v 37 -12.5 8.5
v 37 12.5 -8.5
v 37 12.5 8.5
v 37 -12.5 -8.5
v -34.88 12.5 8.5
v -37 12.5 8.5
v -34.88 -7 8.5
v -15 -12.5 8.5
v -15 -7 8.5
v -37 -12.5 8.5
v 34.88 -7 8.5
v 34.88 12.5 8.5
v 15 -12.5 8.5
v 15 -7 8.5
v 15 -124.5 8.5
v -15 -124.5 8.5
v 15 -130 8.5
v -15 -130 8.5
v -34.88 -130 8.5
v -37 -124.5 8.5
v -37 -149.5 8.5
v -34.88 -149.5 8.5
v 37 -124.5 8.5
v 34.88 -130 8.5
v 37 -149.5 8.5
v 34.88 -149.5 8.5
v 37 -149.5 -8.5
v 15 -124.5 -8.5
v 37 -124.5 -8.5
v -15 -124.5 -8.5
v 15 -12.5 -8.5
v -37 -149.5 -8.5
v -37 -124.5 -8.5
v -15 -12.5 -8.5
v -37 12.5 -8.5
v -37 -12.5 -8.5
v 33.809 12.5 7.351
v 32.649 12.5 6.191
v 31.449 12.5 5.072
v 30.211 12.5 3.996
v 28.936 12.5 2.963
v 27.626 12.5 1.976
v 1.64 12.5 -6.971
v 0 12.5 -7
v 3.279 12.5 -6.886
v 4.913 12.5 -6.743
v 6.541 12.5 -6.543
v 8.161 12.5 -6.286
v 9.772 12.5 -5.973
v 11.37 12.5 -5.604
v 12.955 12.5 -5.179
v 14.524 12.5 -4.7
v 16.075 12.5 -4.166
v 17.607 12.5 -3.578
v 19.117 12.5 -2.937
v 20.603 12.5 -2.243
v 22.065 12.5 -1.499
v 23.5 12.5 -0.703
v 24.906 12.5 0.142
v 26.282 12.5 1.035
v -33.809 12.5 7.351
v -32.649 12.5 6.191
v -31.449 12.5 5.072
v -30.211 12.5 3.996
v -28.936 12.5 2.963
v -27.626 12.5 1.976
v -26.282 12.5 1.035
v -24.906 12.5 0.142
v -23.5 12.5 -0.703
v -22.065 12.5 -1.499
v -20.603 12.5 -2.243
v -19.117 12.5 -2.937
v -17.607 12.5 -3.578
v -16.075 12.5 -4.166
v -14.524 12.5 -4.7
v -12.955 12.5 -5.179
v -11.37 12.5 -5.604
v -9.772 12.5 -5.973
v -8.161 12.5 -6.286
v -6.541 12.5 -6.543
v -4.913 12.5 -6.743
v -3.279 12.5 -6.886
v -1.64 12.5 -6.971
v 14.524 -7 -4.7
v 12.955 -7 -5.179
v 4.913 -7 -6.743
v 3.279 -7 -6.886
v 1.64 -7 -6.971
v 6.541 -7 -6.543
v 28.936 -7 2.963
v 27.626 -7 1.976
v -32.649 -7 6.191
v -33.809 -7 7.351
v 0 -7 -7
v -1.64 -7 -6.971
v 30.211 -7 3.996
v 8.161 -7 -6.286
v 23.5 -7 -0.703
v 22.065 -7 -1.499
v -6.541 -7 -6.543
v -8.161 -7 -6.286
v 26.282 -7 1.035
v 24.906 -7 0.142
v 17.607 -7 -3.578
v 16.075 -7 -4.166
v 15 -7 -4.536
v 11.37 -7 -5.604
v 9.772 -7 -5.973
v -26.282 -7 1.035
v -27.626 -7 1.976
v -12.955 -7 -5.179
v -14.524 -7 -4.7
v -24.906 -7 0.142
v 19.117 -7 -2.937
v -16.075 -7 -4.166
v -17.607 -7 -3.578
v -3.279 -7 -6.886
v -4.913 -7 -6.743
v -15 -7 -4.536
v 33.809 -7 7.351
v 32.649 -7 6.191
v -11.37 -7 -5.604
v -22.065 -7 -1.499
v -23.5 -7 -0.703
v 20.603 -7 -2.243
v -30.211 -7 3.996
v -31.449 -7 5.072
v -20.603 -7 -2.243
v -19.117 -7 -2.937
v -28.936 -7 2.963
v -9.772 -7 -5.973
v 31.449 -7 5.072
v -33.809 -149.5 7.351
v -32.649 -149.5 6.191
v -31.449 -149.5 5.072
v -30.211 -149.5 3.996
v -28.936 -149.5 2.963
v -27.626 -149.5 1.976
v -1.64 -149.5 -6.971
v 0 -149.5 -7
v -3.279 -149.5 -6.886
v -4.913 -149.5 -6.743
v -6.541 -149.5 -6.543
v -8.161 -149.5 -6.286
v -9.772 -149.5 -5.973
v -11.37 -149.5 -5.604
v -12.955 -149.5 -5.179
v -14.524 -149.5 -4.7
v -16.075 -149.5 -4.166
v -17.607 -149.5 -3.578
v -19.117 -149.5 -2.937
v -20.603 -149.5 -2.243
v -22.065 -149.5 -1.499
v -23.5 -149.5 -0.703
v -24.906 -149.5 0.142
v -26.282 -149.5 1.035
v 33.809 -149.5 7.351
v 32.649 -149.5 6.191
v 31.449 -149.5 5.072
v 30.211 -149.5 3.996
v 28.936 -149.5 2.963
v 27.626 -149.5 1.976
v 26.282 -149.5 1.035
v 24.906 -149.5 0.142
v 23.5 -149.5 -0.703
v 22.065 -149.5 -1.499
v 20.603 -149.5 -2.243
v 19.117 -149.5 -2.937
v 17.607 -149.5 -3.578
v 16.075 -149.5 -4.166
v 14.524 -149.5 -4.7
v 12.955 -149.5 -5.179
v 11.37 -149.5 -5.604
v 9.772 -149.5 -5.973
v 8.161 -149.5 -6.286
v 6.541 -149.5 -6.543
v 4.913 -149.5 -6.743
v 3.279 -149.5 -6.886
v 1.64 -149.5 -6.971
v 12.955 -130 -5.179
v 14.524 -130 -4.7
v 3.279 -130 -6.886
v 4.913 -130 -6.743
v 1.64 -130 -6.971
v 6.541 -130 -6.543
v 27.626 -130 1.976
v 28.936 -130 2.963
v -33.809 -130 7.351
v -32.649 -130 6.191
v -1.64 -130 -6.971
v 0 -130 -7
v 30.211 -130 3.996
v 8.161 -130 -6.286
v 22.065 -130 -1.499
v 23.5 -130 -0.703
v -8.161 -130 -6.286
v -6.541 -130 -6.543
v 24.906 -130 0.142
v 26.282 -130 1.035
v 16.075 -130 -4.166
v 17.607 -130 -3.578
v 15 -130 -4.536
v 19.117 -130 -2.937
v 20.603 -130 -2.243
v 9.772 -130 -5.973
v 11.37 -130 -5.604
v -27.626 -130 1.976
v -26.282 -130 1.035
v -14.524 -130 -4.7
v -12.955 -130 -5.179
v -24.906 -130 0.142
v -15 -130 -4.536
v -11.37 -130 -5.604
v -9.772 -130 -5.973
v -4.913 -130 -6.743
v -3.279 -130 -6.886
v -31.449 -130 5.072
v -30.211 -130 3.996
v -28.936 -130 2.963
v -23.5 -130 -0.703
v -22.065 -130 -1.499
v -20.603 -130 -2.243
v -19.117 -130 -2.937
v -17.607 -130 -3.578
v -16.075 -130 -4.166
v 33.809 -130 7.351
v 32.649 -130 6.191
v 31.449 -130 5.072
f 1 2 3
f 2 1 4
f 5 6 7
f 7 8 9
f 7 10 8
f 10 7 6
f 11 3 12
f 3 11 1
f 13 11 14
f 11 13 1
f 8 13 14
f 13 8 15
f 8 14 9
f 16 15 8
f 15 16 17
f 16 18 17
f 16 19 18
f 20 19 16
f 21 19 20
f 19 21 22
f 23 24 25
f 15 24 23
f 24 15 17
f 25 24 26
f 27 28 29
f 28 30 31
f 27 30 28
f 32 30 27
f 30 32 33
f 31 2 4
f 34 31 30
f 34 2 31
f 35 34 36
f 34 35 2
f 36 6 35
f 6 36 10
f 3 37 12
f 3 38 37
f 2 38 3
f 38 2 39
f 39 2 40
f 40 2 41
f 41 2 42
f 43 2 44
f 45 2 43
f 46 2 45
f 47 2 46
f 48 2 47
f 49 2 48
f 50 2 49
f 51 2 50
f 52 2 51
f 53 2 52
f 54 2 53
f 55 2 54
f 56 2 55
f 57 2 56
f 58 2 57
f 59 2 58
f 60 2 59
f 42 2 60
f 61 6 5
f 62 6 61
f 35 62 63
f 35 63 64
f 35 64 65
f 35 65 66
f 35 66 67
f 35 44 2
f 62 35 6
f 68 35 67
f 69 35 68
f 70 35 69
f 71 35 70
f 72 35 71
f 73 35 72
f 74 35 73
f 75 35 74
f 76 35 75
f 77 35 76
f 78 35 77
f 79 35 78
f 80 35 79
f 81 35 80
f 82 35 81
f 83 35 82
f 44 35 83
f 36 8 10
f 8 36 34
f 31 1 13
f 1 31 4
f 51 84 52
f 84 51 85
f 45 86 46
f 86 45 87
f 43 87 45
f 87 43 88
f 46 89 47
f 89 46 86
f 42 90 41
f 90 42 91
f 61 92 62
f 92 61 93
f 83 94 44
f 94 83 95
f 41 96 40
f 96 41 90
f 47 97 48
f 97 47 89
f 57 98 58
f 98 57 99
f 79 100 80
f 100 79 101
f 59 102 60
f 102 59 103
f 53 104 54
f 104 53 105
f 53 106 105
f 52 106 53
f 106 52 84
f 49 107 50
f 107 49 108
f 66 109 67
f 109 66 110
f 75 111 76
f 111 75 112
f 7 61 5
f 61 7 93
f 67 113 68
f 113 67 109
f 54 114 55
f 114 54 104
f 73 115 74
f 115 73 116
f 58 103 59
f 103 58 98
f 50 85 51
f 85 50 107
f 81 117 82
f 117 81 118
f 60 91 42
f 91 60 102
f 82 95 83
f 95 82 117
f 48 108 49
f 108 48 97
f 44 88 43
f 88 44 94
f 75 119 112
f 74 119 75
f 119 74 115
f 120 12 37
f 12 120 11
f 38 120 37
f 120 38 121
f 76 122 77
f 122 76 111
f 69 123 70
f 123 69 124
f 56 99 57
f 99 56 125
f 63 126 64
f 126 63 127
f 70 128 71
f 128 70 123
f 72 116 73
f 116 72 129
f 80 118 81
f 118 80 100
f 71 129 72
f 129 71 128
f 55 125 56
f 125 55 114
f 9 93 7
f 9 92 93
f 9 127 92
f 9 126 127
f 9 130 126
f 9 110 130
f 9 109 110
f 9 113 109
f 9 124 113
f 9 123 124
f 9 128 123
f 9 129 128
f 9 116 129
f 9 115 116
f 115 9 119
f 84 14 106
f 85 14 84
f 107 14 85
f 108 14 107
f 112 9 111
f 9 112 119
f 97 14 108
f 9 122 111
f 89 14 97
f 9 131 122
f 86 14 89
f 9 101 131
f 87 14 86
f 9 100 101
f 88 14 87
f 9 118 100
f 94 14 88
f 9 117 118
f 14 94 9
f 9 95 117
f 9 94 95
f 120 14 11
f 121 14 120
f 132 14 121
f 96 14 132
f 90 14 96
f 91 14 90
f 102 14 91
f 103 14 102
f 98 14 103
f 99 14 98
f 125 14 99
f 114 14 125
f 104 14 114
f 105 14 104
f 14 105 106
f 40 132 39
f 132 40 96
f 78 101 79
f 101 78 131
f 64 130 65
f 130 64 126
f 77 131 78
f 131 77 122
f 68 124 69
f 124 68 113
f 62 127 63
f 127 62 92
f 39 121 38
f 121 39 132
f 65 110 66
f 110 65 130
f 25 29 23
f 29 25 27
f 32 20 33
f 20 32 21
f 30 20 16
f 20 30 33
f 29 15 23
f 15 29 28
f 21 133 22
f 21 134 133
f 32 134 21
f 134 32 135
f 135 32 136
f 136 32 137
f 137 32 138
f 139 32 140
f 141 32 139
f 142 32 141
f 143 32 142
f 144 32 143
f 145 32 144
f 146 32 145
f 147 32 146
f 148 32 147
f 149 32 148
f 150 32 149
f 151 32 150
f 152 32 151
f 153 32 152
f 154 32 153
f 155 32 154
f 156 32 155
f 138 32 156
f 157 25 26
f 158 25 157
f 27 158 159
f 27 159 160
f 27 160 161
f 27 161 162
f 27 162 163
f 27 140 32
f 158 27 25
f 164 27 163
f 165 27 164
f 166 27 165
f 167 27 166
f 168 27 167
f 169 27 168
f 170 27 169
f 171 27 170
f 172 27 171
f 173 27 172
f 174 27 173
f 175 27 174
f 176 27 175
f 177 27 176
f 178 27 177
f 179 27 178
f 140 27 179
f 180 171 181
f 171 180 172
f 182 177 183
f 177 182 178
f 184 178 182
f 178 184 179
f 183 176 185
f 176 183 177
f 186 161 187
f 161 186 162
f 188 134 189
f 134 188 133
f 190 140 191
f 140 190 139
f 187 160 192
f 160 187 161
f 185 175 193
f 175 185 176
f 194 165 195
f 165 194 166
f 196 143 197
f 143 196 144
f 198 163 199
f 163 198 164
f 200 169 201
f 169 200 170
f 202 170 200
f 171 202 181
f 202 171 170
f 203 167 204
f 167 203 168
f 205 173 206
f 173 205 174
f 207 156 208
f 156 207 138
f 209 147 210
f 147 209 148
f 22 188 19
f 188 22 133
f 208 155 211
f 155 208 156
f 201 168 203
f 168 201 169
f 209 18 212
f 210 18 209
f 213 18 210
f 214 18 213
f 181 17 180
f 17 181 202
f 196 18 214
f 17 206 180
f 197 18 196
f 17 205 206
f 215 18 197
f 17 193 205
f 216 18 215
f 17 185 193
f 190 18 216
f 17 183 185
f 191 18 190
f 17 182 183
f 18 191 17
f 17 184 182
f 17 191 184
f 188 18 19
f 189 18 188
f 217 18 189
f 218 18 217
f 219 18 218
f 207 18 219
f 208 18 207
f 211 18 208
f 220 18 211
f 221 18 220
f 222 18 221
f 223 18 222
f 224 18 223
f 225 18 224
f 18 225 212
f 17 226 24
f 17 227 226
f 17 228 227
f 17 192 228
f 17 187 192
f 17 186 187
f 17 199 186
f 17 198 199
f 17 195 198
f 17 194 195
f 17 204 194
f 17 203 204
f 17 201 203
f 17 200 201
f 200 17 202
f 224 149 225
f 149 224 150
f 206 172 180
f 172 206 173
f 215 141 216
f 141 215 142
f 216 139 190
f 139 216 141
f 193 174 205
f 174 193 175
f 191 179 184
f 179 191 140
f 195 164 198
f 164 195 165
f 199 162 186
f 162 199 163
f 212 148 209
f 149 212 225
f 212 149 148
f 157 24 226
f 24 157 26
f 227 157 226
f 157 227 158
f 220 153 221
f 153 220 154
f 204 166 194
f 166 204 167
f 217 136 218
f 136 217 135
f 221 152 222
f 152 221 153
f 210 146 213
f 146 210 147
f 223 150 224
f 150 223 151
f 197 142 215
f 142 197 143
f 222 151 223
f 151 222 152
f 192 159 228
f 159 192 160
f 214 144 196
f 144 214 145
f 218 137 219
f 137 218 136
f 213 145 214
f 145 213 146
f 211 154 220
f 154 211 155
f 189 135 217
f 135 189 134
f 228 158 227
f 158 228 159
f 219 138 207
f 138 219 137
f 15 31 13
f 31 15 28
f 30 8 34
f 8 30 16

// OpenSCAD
$fn = 180;

d = 94;


difference() {
    cube([74, 25, 17], true);
    translate([0, 3, 40]) 
        rotate([90, 0, 0]) 
            cylinder(h = 20, d = d, center = true);
}

translate([0, -137, 0]) difference() {
    cube([74, 25, 17], true);
    translate([0, -3, 40]) 
        rotate([90, 0, 0]) 
            cylinder(h = 20, d = d, center = true);
}
translate([0, -68.5, 0]) cube([30, 123, 17], center = true);
